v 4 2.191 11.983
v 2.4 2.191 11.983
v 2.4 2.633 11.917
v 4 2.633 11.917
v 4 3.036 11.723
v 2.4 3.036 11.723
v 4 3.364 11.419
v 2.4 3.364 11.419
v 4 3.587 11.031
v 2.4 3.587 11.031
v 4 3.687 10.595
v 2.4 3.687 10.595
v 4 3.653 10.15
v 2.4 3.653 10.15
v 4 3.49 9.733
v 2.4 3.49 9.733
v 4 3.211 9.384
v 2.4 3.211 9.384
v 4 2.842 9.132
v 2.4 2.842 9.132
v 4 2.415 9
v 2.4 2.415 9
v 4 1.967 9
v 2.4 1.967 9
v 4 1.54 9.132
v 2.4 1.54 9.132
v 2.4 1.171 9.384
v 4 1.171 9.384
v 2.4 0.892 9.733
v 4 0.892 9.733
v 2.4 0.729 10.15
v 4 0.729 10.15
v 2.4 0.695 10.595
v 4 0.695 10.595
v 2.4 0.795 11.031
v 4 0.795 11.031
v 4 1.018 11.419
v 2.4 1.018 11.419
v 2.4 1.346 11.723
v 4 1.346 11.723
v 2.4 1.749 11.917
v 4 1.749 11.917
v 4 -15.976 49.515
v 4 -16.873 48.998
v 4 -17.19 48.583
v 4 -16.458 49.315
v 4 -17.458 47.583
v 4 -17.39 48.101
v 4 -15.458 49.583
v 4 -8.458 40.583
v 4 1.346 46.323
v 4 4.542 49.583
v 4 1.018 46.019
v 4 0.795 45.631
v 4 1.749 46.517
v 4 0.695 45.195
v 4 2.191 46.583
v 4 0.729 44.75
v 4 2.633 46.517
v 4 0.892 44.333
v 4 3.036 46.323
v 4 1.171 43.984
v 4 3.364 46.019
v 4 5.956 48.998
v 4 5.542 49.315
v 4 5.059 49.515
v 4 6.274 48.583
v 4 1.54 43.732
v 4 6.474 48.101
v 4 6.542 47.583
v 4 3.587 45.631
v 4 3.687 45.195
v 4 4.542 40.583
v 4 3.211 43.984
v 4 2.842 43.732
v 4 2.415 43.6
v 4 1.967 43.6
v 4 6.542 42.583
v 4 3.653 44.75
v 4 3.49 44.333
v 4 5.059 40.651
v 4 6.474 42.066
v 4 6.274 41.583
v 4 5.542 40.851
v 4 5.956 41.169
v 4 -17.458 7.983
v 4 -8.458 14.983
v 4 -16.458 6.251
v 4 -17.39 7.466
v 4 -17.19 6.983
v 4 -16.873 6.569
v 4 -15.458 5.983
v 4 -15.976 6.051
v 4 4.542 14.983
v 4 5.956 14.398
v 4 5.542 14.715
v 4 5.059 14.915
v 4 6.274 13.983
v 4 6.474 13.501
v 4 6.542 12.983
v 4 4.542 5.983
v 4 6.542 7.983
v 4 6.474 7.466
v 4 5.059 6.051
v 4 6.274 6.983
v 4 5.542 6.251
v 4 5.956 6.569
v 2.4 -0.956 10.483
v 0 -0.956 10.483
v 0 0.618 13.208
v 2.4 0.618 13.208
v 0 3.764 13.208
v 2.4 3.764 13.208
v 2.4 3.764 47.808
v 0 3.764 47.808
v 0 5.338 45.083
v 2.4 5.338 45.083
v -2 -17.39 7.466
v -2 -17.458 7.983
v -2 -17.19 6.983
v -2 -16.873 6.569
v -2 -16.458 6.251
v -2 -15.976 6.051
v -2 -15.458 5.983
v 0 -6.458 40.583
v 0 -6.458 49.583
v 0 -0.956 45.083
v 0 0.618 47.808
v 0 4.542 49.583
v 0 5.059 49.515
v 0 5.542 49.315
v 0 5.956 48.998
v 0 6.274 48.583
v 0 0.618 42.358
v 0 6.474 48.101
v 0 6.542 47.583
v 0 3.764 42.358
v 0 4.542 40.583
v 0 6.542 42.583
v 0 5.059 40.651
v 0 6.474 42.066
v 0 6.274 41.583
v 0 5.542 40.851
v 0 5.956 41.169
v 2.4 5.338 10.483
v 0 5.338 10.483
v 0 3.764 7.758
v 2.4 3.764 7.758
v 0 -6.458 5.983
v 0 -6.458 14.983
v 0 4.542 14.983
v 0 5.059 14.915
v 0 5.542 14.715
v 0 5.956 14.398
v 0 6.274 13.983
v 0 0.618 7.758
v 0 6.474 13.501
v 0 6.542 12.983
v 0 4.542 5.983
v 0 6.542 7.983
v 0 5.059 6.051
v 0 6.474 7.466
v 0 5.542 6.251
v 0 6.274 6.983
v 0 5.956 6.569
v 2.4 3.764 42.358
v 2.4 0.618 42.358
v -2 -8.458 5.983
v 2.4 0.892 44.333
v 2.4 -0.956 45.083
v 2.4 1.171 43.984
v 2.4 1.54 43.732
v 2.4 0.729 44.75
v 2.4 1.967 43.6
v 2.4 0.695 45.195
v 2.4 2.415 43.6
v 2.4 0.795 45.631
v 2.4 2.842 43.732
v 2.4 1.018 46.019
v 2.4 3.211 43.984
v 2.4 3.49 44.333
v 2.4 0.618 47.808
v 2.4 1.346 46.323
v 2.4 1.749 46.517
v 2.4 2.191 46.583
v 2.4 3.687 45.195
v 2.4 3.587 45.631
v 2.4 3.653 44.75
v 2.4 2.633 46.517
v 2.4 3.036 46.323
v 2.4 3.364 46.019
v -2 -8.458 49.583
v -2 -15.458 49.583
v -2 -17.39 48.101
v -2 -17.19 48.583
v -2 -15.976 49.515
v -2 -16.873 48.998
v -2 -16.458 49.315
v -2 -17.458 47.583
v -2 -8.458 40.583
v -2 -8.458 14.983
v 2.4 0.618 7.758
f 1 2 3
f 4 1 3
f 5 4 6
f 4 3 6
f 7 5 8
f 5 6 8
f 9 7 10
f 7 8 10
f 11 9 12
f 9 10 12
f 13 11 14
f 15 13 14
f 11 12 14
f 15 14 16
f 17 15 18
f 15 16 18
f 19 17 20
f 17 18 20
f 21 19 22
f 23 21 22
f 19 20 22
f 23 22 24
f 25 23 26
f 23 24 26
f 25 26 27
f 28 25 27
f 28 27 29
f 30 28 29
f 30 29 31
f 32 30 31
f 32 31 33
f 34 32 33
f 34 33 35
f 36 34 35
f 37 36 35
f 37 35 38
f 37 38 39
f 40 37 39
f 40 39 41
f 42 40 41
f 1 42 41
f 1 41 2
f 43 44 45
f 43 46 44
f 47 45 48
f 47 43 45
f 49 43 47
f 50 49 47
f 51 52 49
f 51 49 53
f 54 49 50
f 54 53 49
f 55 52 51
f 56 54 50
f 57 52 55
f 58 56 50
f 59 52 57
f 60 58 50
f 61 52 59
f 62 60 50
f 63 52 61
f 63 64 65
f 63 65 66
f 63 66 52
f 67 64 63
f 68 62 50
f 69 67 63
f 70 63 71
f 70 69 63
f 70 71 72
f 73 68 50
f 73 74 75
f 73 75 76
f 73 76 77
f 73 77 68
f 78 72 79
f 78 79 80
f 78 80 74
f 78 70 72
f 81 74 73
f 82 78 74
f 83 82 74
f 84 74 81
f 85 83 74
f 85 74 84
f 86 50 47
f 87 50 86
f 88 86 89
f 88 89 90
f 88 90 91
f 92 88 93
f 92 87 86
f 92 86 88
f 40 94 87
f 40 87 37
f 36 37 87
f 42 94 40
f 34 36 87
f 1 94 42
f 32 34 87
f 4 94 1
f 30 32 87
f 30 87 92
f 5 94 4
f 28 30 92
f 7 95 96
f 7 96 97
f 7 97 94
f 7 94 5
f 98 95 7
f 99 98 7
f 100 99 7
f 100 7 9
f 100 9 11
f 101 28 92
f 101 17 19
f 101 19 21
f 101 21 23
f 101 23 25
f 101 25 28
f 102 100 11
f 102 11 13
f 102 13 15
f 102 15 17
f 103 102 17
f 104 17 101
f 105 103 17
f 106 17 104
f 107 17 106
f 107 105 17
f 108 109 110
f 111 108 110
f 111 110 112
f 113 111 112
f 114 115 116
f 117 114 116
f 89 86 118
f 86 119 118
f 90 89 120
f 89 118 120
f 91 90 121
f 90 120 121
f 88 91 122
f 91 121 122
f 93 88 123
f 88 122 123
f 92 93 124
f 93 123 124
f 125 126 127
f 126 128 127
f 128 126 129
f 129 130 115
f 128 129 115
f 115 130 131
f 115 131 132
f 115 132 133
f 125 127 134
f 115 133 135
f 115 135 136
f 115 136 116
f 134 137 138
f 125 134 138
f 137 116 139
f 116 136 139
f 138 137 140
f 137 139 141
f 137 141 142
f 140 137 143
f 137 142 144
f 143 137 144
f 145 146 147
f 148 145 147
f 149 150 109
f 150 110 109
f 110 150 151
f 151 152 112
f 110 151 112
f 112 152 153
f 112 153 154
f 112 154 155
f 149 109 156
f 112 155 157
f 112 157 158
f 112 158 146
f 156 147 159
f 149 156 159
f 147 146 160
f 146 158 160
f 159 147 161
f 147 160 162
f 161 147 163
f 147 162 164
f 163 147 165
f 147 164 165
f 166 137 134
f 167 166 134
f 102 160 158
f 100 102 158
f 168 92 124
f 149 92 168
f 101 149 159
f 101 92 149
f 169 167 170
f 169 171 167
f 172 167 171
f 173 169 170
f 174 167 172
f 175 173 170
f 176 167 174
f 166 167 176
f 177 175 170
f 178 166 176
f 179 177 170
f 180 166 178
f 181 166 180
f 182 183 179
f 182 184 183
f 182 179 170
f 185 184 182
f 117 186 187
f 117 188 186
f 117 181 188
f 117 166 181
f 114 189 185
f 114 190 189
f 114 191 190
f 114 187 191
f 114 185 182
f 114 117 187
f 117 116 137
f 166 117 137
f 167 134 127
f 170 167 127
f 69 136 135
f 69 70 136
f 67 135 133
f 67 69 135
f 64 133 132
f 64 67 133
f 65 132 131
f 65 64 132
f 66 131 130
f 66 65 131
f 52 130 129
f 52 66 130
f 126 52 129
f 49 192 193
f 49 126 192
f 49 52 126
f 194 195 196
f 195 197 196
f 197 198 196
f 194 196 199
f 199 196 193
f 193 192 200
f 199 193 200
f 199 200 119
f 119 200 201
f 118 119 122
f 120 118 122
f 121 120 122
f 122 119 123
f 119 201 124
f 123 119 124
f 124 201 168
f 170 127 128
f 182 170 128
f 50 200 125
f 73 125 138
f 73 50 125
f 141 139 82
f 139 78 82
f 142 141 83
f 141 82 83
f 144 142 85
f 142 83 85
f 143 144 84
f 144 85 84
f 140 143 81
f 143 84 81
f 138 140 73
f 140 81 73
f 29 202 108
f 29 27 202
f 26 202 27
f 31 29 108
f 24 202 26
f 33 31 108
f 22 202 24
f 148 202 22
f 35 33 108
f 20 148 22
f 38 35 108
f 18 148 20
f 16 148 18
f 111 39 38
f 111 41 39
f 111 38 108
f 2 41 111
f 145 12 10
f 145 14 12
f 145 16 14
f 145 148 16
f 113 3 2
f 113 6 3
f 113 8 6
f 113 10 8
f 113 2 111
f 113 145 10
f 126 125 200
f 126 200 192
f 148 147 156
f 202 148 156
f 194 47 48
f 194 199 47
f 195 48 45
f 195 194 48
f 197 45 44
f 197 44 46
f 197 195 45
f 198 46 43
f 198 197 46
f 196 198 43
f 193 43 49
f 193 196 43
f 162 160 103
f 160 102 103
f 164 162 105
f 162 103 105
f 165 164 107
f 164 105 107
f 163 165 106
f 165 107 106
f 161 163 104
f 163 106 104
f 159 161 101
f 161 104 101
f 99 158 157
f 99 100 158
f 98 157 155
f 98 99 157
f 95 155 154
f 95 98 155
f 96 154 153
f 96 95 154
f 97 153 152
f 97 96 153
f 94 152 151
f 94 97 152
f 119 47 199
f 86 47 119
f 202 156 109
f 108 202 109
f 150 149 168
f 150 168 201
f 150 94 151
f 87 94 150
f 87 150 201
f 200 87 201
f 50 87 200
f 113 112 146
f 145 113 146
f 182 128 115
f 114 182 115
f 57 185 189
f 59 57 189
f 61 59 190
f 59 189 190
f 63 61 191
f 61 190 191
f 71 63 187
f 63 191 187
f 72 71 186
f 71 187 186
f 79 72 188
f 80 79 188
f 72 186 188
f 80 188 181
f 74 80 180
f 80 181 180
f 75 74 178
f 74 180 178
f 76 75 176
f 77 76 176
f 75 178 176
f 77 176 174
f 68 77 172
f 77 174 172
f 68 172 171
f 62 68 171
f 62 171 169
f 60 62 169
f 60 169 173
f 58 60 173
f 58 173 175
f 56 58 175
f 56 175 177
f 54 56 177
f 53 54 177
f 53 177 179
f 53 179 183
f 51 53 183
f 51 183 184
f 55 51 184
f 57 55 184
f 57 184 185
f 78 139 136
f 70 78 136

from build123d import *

# Parameters (mm, degrees)
EXTRUDE_1_DEPTH     = 4
SKETCH_2_R          = 1.5
CUT_EXTRUDE_1_DEPTH = 53.719070053
CUT_EXTRUDE_3_DEPTH = 2.4
EXTRUDE_2_DEPTH     = 2
FILLET_3_R          = 2
CHAMFER_1_SIZE      = 2


with BuildPart() as part:
    # Эскиз1 → Бобышка-Вытянуть1 (new body)
    with BuildSketch(Plane(origin=(0, 0, 0), x_dir=(0, 0, -1), z_dir=(1, 0, 0))):
        Polygon((-49.583333333, 6.541666667), (-49.583333333, -17.458333333), (-5.983333333, -17.458333333), (-5.983333333, 6.541666667), (-14.983333333, 6.541666667), (-14.983333333, -8.458333333), (-40.583333333, -8.458333333), (-40.583333333, 6.541666667), align=None)
    extrude(amount=EXTRUDE_1_DEPTH)

    # Эскиз2 → Вырез-Вытянуть1 (cut, through all)
    with BuildSketch(Plane.ZY):
        with Locations((10.483333333, 2.190961295)):
            Circle(SKETCH_2_R)
        with Locations((45.083333333, 2.190961295)):
            Circle(SKETCH_2_R)
    extrude(amount=-CUT_EXTRUDE_1_DEPTH, mode=Mode.SUBTRACT)

    # Эскиз4 → Вырез-Вытянуть3 (cut)
    with BuildSketch(Plane.ZY):
        Polygon((10.483333333, 5.337520262), (7.758333333, 3.764240779), (7.758333333, 0.617681812), (10.483333333, -0.955597672), (13.208333333, 0.617681812), (13.208333333, 3.764240779), align=None)
        Polygon((45.083333333, 5.337520262), (42.358333333, 3.764240779), (42.358333333, 0.617681812), (45.083333333, -0.955597672), (47.808333333, 0.617681812), (47.808333333, 3.764240779), align=None)
    extrude(amount=-CUT_EXTRUDE_3_DEPTH, mode=Mode.SUBTRACT)

    # Эскиз6 → Бобышка-Вытянуть2 (add)
    with BuildSketch(Plane.ZY):
        Polygon((5.983333333, -6.458333333), (14.983333333, -6.458333333), (14.983333333, -8.458333333), (40.583333333, -8.458333333), (40.583333333, -6.458333333), (49.583333333, -6.458333333), (49.583333333, -17.458333333), (5.983333333, -17.458333333), align=None)
    extrude(amount=EXTRUDE_2_DEPTH)

    # Скругление3
    fillet_3_edges = [part.edges().sort_by_distance(p)[0] for p in [
        (2, 6.541666667, 40.583333333),
        (2, 6.541666667, 14.983333333),
        (2, 6.541666667, 5.983333333),
        (1, -17.458333333, 5.983333333),
        (1, -17.458333333, 49.583333333),
        (2, 6.541666667, 49.583333333),
    ]]
    fillet(fillet_3_edges, radius=FILLET_3_R)

    # Фаска1
    chamfer_1_edges = [part.edges().sort_by_distance(p)[0] for p in [
        (-2, -6.458333333, 10.483333333),
        (-2, -6.458333333, 45.083333333),
    ]]
    chamfer(chamfer_1_edges, length=CHAMFER_1_SIZE - 0.0001)  # a hair under: the kernel refuses the full size


solid = part.part
